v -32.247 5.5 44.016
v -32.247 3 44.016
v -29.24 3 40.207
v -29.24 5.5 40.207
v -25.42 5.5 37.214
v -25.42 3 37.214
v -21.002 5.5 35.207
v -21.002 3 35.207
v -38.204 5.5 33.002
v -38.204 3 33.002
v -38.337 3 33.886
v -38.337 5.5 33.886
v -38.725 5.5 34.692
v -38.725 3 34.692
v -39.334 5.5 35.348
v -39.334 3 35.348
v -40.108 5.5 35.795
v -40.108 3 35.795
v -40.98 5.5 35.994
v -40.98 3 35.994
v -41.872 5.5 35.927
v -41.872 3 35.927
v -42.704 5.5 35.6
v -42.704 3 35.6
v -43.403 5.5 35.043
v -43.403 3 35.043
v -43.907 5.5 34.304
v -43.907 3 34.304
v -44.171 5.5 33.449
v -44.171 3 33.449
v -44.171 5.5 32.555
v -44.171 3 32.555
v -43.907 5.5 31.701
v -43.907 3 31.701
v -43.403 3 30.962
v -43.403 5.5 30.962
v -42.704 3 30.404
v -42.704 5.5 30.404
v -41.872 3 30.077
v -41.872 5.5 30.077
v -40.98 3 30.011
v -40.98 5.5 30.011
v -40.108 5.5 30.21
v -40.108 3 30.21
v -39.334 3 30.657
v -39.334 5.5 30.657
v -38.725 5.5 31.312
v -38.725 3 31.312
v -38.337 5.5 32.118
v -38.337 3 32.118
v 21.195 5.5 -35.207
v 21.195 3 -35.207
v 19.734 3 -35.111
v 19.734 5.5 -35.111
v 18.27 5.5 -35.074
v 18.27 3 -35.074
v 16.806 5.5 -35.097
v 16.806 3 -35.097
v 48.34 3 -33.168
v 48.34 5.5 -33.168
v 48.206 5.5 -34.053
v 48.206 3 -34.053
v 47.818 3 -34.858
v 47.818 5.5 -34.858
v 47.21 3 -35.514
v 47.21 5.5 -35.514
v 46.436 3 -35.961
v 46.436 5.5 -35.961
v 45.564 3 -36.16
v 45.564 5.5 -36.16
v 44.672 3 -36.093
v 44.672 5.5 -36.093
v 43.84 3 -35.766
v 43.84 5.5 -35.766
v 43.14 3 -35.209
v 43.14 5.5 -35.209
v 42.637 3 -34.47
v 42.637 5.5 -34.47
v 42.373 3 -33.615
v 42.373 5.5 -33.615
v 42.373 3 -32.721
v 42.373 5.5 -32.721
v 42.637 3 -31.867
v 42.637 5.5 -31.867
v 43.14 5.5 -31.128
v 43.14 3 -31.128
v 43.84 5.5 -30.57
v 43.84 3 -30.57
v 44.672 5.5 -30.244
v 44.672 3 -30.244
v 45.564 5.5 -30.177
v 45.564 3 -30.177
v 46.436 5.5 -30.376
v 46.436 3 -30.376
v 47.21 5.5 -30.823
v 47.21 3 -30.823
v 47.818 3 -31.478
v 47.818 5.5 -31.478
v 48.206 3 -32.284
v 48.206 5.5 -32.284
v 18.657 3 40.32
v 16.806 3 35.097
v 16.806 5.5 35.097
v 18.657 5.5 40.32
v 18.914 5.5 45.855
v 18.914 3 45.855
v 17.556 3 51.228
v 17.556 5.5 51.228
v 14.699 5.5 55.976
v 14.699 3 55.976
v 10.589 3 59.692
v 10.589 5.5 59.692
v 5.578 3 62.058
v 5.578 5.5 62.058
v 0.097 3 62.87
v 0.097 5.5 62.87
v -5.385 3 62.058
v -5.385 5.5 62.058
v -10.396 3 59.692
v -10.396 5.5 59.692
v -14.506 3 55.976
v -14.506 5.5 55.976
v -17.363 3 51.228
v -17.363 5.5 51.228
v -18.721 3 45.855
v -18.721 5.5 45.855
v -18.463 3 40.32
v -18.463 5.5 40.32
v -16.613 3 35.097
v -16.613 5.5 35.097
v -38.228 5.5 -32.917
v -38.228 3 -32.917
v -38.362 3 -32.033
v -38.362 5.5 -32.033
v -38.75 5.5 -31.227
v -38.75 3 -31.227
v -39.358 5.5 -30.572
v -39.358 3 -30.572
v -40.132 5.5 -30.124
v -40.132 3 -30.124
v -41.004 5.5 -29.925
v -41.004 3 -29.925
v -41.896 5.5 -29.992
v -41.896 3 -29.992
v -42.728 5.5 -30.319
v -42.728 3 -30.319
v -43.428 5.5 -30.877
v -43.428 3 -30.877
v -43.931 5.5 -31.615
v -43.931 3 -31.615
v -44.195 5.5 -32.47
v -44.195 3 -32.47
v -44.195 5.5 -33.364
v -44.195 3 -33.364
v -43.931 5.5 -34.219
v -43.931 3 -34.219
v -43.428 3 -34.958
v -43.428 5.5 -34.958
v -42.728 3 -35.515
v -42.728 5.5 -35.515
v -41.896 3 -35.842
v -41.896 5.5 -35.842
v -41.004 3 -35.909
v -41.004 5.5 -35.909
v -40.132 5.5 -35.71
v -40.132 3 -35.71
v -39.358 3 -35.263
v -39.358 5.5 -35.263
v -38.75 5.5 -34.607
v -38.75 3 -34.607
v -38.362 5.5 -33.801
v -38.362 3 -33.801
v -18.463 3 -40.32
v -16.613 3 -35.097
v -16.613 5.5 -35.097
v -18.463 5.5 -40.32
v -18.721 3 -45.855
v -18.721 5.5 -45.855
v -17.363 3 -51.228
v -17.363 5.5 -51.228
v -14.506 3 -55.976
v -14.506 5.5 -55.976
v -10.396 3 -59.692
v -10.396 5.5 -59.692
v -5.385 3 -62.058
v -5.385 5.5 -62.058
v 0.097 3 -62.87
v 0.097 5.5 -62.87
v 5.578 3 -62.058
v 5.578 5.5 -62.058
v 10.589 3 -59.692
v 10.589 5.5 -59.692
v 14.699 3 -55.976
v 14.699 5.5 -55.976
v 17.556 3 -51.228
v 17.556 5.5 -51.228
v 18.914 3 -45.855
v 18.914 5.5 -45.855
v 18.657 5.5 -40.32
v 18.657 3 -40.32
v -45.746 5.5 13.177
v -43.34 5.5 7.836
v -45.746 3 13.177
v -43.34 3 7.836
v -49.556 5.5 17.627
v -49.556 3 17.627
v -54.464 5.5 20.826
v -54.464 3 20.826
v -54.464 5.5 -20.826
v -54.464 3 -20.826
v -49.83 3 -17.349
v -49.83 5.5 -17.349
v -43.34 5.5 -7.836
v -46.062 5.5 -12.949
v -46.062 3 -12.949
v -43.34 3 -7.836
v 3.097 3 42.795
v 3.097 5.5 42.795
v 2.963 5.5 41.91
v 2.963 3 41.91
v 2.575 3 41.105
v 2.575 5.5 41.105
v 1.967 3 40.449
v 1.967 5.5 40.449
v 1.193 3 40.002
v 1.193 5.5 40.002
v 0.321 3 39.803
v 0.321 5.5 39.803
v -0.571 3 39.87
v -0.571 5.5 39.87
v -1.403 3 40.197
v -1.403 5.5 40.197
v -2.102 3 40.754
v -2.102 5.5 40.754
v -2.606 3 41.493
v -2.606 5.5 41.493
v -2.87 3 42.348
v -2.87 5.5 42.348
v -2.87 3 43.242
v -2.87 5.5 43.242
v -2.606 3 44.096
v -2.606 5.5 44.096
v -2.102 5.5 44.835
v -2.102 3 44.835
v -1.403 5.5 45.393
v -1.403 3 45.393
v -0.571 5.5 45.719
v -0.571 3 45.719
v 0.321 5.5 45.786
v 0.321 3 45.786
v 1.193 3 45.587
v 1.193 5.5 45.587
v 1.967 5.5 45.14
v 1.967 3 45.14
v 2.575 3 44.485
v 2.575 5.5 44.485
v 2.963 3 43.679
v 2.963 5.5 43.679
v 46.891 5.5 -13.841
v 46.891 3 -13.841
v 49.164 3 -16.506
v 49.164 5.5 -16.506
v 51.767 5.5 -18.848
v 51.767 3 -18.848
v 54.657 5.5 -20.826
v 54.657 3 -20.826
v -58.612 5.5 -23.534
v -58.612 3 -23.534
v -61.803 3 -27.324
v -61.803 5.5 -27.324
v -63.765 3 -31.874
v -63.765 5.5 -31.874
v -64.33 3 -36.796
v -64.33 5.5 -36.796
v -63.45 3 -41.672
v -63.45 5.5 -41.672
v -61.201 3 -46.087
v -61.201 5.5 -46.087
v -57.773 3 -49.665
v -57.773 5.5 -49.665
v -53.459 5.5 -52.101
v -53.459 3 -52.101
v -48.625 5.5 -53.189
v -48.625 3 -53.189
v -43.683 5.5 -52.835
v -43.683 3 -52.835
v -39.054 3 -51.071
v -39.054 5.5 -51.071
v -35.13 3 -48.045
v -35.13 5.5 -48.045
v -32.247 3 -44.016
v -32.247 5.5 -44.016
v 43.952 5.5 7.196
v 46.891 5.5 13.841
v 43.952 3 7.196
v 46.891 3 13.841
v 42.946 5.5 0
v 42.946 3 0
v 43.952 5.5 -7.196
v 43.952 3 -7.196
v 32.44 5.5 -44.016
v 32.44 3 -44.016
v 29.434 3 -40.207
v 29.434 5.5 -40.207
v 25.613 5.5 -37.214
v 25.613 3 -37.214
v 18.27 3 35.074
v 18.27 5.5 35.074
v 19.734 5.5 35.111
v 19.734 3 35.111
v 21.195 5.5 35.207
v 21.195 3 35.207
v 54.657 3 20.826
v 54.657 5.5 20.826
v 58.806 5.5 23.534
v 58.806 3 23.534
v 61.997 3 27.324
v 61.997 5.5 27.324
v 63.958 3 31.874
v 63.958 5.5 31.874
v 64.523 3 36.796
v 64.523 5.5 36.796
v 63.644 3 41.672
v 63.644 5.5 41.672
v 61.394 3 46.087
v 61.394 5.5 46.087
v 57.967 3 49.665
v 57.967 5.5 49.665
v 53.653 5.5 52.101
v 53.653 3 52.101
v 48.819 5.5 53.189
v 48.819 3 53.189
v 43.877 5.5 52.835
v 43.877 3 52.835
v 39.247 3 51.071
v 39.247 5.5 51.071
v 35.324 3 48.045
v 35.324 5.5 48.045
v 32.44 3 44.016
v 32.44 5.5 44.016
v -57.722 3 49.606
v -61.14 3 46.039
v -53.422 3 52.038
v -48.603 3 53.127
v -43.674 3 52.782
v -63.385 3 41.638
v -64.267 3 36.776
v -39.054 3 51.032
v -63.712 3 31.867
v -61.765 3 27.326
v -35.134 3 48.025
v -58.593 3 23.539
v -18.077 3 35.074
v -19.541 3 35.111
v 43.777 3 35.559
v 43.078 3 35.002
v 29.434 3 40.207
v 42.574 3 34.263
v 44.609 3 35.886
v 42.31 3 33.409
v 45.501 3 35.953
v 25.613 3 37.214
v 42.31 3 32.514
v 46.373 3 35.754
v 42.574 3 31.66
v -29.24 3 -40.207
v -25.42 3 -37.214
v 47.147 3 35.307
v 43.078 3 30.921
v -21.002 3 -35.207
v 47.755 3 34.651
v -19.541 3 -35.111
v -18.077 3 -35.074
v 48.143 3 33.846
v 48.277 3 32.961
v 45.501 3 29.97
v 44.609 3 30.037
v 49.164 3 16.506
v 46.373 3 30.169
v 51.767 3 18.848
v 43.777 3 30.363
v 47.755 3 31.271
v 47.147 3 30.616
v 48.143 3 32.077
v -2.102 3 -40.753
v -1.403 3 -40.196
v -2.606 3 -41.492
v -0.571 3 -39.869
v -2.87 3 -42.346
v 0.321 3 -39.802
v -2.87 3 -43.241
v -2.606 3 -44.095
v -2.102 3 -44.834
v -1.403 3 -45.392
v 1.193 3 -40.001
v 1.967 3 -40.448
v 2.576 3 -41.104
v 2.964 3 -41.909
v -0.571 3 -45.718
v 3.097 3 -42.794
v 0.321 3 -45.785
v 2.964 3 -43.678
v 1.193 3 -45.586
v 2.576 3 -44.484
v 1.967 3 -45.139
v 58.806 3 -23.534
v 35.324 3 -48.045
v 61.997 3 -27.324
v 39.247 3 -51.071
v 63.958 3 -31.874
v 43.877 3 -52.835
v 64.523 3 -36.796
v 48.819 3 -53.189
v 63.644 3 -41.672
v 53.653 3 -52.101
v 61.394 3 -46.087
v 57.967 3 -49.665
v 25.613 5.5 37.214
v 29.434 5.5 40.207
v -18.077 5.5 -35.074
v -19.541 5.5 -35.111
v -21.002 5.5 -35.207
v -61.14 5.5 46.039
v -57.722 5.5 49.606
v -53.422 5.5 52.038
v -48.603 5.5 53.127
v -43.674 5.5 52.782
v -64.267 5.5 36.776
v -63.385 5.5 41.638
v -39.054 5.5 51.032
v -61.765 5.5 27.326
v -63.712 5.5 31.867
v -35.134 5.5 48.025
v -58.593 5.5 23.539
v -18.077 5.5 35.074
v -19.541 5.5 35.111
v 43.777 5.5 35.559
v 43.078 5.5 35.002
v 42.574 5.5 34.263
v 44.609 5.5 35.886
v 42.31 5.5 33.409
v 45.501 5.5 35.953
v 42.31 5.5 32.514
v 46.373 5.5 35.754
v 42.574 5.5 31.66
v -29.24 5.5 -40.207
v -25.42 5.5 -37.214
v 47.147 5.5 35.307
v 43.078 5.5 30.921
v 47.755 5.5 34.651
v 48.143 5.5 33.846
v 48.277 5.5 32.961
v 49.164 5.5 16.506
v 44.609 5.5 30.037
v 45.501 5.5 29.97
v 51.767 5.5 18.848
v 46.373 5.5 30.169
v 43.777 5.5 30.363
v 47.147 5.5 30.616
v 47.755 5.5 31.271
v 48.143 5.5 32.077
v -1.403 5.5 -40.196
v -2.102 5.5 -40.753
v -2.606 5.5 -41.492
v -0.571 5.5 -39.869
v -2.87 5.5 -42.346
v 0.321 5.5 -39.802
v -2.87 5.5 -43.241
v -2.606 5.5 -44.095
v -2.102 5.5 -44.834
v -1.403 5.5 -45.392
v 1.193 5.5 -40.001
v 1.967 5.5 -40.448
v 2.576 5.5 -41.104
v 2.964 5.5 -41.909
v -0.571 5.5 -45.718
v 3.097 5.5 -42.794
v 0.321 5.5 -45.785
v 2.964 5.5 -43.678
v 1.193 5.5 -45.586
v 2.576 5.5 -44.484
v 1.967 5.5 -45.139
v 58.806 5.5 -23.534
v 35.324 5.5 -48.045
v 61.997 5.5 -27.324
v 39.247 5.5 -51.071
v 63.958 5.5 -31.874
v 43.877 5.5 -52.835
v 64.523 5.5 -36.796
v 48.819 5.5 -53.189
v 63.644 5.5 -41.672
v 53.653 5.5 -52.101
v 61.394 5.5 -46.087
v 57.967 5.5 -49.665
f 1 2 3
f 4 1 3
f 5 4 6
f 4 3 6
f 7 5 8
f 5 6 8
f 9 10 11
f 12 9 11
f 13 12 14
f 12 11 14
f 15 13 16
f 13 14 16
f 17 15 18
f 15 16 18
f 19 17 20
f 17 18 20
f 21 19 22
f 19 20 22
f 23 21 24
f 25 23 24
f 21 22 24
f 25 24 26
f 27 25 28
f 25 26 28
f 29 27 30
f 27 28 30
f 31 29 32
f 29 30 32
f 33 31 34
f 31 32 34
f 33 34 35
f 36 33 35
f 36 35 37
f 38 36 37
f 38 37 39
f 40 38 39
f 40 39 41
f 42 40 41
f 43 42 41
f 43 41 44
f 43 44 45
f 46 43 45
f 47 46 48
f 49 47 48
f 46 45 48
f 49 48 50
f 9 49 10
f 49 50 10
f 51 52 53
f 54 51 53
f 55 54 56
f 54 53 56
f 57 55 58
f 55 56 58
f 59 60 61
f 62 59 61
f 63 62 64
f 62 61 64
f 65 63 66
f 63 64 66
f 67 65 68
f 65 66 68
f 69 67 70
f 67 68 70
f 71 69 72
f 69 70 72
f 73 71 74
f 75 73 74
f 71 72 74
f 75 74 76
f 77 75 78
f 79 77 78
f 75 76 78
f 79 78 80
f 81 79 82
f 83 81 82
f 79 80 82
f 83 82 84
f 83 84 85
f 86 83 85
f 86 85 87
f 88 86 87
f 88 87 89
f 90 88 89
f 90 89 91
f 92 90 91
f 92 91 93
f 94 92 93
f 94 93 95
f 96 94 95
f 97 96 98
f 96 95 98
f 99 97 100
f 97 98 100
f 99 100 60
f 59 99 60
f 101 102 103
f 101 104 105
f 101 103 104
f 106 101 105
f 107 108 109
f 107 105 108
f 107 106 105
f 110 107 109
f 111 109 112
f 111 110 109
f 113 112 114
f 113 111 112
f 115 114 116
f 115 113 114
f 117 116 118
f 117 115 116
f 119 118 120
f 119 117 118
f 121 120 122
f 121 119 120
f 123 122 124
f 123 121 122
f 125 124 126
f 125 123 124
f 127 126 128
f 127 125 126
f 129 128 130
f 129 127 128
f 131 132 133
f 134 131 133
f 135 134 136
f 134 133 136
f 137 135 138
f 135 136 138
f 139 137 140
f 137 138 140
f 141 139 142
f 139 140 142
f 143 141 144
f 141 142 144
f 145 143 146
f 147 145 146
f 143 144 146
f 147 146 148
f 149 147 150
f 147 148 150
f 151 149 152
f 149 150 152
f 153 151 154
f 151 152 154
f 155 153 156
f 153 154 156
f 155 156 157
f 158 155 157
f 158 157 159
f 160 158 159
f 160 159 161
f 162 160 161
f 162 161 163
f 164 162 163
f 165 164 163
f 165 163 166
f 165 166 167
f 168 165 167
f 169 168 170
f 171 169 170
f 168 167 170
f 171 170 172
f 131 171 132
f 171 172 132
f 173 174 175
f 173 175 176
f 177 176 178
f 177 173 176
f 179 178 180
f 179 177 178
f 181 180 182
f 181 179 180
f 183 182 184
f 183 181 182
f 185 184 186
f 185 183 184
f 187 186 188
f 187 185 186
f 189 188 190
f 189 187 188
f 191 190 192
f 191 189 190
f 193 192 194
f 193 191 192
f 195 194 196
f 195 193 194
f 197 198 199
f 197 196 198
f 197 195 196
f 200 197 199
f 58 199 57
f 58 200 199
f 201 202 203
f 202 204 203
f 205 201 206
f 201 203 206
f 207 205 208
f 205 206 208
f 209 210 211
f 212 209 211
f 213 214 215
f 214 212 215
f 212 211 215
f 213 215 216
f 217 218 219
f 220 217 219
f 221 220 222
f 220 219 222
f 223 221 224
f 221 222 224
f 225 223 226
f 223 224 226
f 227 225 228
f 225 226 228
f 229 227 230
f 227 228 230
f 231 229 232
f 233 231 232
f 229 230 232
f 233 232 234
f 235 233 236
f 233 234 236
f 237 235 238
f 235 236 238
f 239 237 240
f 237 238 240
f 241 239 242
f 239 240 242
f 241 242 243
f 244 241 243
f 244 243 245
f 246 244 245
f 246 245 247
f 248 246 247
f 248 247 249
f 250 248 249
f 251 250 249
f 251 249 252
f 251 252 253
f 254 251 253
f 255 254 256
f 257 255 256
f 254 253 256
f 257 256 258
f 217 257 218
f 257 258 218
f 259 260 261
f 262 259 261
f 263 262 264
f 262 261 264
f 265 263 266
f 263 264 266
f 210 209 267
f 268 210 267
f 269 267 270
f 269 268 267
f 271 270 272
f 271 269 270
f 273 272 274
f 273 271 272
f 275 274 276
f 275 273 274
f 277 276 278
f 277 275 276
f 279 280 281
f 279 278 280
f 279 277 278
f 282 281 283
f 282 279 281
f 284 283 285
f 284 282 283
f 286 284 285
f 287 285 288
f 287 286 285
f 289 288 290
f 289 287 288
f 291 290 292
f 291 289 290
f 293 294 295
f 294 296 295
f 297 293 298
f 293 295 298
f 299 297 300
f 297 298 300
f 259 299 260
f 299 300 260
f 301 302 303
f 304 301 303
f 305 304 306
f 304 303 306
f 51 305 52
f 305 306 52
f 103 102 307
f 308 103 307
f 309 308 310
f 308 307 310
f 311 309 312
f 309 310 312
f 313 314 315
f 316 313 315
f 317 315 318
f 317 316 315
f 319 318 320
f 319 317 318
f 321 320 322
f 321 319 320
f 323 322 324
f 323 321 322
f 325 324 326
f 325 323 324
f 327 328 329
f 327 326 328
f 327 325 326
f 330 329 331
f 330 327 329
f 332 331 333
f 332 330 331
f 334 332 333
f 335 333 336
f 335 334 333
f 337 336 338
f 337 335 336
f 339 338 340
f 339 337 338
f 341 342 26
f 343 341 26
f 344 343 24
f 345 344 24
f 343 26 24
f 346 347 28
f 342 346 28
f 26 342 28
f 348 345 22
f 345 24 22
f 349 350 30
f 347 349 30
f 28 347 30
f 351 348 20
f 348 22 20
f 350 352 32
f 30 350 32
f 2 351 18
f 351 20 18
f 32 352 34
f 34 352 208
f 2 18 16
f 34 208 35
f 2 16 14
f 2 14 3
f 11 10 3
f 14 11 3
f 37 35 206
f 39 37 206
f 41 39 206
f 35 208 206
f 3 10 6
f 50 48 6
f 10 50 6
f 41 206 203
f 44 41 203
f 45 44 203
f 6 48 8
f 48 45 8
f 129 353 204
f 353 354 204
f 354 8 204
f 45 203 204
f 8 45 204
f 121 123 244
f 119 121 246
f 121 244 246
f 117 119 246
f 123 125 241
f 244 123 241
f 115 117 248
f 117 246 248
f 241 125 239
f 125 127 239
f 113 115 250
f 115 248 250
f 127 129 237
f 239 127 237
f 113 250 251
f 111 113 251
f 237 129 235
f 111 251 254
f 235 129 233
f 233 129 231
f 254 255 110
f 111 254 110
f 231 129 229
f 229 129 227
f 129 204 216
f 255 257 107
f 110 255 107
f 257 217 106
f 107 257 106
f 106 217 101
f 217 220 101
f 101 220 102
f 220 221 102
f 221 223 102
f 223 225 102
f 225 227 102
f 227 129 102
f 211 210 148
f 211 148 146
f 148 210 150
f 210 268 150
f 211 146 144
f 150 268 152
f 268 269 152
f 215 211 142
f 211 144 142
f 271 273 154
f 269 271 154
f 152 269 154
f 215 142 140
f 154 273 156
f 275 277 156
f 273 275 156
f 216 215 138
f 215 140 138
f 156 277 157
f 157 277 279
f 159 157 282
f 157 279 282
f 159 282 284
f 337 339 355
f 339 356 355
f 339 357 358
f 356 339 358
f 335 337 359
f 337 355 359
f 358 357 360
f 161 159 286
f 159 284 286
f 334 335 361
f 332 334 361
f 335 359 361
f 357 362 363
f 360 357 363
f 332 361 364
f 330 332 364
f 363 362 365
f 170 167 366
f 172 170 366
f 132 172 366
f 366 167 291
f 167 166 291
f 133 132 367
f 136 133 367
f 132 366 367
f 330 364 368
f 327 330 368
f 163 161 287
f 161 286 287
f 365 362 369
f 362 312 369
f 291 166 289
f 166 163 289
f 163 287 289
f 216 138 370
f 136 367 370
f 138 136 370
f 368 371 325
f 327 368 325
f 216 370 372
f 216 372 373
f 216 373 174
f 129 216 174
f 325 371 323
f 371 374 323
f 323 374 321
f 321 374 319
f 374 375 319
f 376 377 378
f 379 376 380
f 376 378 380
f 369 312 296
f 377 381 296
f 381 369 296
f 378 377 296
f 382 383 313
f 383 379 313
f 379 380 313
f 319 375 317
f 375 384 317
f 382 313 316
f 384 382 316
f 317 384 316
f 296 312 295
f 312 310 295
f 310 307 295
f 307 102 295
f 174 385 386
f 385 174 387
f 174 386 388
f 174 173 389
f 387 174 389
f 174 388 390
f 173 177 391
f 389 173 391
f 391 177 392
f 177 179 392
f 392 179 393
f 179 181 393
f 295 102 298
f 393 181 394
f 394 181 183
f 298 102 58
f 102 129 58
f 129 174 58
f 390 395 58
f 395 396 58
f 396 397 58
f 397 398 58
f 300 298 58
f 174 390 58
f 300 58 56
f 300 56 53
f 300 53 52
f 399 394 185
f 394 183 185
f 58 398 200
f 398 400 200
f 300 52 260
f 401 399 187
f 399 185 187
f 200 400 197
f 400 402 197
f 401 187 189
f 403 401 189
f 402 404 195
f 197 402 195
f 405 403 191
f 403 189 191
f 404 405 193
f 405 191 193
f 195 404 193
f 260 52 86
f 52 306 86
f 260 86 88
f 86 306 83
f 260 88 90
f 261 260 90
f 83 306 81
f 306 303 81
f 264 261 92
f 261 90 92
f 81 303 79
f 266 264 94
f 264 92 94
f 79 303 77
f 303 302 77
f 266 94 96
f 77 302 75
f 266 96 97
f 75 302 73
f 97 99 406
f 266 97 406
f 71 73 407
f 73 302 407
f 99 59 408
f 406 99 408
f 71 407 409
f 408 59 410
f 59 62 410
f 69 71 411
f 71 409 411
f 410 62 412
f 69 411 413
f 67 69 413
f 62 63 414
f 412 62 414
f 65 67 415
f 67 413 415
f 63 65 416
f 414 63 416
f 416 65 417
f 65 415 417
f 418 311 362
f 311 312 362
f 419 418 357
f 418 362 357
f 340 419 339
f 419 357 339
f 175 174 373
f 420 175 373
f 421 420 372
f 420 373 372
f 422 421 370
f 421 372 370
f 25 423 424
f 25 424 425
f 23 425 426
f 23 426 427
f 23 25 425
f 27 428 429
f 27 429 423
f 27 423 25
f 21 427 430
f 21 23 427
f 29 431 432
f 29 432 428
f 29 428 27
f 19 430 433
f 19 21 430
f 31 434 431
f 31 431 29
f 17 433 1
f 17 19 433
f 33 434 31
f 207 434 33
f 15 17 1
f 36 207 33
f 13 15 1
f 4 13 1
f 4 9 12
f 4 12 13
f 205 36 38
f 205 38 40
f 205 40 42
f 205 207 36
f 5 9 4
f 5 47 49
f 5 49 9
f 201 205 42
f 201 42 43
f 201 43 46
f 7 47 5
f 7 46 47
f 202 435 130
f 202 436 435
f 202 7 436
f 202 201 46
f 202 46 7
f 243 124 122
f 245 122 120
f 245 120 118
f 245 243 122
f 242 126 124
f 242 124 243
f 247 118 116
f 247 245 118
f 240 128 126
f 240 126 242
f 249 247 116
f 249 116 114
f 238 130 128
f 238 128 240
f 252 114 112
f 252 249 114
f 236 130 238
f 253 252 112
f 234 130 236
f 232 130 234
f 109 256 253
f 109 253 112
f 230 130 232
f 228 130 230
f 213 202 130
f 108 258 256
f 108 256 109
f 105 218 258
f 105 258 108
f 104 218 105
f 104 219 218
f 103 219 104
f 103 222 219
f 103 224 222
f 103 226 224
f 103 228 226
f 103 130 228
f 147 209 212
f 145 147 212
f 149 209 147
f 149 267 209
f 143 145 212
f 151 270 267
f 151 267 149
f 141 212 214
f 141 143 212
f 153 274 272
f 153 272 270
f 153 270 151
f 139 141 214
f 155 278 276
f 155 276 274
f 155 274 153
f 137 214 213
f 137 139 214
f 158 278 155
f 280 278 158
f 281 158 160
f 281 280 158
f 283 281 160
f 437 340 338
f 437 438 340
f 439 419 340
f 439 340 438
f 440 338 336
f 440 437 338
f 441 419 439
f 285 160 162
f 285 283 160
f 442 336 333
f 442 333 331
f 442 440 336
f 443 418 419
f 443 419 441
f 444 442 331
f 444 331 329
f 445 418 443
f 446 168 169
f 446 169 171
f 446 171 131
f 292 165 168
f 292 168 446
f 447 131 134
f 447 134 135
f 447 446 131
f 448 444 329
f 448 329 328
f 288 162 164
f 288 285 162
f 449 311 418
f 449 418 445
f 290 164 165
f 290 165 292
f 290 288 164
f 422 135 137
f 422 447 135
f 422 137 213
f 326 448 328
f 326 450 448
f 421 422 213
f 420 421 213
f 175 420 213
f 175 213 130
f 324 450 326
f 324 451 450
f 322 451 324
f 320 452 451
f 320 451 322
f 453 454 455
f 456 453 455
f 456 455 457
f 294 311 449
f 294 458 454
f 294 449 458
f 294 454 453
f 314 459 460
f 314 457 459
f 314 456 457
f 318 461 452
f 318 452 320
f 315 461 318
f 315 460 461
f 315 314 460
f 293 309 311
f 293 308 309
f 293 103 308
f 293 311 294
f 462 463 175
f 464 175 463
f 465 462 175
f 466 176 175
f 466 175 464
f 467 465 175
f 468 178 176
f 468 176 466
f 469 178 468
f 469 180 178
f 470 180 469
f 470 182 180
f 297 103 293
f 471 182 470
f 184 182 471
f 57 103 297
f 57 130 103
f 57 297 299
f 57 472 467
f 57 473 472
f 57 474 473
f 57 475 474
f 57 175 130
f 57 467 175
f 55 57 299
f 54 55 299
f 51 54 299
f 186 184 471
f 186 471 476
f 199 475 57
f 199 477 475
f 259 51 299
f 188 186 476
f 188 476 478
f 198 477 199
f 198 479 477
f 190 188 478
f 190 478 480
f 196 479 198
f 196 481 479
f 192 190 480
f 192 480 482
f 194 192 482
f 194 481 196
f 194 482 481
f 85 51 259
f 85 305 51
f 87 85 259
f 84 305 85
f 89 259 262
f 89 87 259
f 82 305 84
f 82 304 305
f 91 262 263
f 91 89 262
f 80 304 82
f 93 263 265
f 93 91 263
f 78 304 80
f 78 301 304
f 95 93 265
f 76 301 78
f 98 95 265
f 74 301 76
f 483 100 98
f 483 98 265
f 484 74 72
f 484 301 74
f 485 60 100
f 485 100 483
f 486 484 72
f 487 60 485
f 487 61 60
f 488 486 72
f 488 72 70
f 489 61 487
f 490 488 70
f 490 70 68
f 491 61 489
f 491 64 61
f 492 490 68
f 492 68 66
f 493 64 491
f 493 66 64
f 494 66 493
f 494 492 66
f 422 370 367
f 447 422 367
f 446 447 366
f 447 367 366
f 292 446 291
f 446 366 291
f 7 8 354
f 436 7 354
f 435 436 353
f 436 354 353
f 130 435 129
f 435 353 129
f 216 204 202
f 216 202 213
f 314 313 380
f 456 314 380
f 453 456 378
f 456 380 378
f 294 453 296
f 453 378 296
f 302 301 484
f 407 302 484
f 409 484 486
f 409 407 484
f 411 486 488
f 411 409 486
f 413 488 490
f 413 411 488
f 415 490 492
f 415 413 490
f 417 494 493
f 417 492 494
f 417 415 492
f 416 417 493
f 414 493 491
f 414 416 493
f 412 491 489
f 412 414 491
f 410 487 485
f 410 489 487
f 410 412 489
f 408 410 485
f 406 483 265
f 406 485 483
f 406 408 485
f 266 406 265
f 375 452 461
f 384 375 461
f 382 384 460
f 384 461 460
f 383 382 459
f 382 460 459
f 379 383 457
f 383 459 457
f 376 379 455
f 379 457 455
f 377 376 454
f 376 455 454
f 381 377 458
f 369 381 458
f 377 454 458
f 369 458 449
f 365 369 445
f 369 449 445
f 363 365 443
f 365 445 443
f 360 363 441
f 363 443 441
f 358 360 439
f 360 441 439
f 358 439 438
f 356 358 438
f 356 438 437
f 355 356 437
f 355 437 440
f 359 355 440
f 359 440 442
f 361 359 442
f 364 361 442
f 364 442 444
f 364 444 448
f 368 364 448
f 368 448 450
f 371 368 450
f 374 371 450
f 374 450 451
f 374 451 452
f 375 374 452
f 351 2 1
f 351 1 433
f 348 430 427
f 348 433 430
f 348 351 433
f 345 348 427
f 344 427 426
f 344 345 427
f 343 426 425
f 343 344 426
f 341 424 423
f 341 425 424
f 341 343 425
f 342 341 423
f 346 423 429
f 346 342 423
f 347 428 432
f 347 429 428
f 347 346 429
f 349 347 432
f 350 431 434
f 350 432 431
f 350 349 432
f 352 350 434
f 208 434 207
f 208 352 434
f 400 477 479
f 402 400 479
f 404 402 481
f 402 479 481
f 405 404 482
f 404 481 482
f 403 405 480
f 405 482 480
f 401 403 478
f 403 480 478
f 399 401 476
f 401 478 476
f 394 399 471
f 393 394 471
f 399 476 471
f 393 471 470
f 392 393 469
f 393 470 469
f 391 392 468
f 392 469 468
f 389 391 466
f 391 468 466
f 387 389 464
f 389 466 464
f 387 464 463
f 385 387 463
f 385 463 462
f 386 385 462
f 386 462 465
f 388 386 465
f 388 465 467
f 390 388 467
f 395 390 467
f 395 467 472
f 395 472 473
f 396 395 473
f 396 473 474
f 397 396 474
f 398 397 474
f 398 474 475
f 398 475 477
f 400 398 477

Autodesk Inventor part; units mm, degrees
ref_plane "YZ Plane" through (0, 0, 0) normal (1, 0, 0) x (0, 1, 0)
ref_plane "XZ Plane" through (0, 0, 0) normal (0, 1, 0) x (-1, 0, 0)
ref_plane "XY Plane" through (0, 0, 0) normal (0, 0, 1) x (1, 0, 0)
ref_plane "Work Plane1" through (0.0967, 3, -43.9566) normal (0, 1, 0) x (1, 0, 0)
sketch "Sketch1" plane through (0.0967, 3, -43.9566) normal (0, 1, 0) x (1, 0, 0)
  line L0 (-43.4364, -51.7928) -> (-43.4364, -36.1204)
  line L1 (-43.4364, -36.1204) -> (-43.4364, -51.7928) projected
  arc A0 (-43.4364, -36.1204) -> (-54.5602, -23.1308) centre (-68.0614, -45.9505) ccw
  arc A1 (-32.3435, 0.0592) -> (-54.5602, -23.1308) centre (-47.45, -7.7054) ccw
  arc A2 (-32.3435, 0.0592) -> (-54.5602, -23.1308) centre (-47.45, -7.7054) ccw projected
  arc A3 (-32.3435, 0.0592) -> (-21.0984, -8.7493) centre (-14.9187, 10.7219) ccw
  arc A4 (-21.0984, -8.7493) -> (-16.7095, -8.8597) centre (-18.0001, 27.1171) ccw
  arc A5 (16.7095, -8.8597) -> (-16.7095, -8.8597) centre (0, 0) ccw
  arc A6 (16.7095, -8.8597) -> (21.0984, -8.7493) centre (18.0001, 27.1171) ccw
  arc A7 (21.0984, -8.7493) -> (32.3435, 0.0592) centre (14.9187, 10.7219) ccw
  arc A8 (54.5602, -23.1308) -> (32.3435, 0.0592) centre (47.45, -7.7054) ccw
  arc A9 (54.5602, -23.1308) -> (46.7947, -30.1154) centre (68.0614, -45.9505) ccw
  arc A10 (46.7947, -30.1154) -> (46.7947, -57.7978) centre (69.1023, -43.9566) ccw
  arc A11 (46.7947, -57.7978) -> (54.5602, -64.7824) centre (68.0614, -41.9626) ccw
  arc A12 (32.3435, -87.9724) -> (54.5602, -64.7824) centre (47.45, -80.2078) ccw
  arc A13 (32.3435, -87.9724) -> (21.0984, -79.1639) centre (14.9187, -98.6351) ccw
  arc A14 (21.0984, -79.1639) -> (16.7095, -79.0534) centre (18.0001, -115.0303) ccw
  arc A15 (-16.7095, -79.0534) -> (16.7095, -79.0534) centre (0, -87.9132) ccw
  arc A16 (-16.7095, -79.0534) -> (-21.0984, -79.1639) centre (-18.0001, -115.0303) ccw
  arc A17 (-21.0984, -79.1639) -> (-32.3435, -87.9724) centre (-14.9187, -98.6351) ccw
  arc A18 (-54.5602, -64.7824) -> (-32.3435, -87.9724) centre (-47.4075, -80.167) ccw
  arc A19 (-54.5602, -64.7824) -> (-43.4364, -51.7928) centre (-63.2568, -46.0771) ccw
  point P0 (-0.0967, -43.9566)
extrude "Extrusion1" add sketch "Sketch1" along normal blind 2.5
sketch "Sketch2" plane through (0.0967, 5.5, -43.9566) normal (0, 1, 0) x (1, 0, 0)
  point P0 (-0.0967, -43.9566)
sketch "Sketch4" plane through (0.0967, 5.5, -43.9566) normal (0, 1, 0) x (1, 0, 0)
  point P0 (-0.0967, -43.9566)
sketch "Sketch7" plane through (0.0967, 5.5, -43.9566) normal (0, 1, 0) x (1, 0, 0)
  circle A0 centre (0.0002, -1.163) radius 3
  point P0 (-0.0967, -43.9566)
  dimension "d12" = 6
extrude "Extrusion5" cut sketch "Sketch7" against normal blind 3.65
sketch "Sketch8" plane through (0.0967, 5.5, -43.9566) normal (0, 1, 0) x (1, 0, 0)
  arc A0 (-16.7095, -79.0534) -> (16.7095, -79.0534) centre (0, -87.9132) ccw projected
  arc A1 (16.7095, -8.8597) -> (-16.7095, -8.8597) centre (0, 0) ccw projected
  circle A2 centre (0, -86.7513) radius 3
  point P0 (-0.0967, -43.9566)
  dimension "d15" = 87.9132
  dimension "d16" = 6
extrude "Extrusion6" cut sketch "Sketch8" against normal blind 3.65
sketch "Sketch9" plane through (0.0967, 5.5, -43.9566) normal (0, 1, 0) x (1, 0, 0)
  point P0 (-0.0967, -43.9566)
sketch "Sketch21" plane through (0.0967, 5.5, -43.9566) normal (0, 1, 0) x (1, 0, 0)
  circle A0 centre (45.2429, -10.7883) radius 3
  point P0 (-0.0967, -43.9566)
  dimension "d34" = 6
extrude "Extrusion7" cut sketch "Sketch21" against normal blind 4.2875
sketch "Sketch22" plane through (0.0967, 5.5, -43.9566) normal (0, 1, 0) x (1, 0, 0)
  point P0 (-0.0967, -43.9566)
  point P1 (-0.0967, -43.9566)
sketch "Sketch24" plane through (0.0967, 5.5, -43.9566) normal (0, 1, 0) x (1, 0, 0)
  point P0 (-0.0967, -43.9566)
pattern_circular "Circular Pattern1" count 6 over 360 about axis through (45.3396, 5.5, -33.1683) along (0, -1, 0) of "Extrusion7"
sketch "Sketch25" plane through (0.0967, 5.5, -43.9566) normal (0, 1, 0) x (1, 0, 0)
  point P0 (-0.0967, -43.9566)
sketch "Sketch26" plane through (0.0967, 5.5, -43.9566) normal (0, 1, 0) x (1, 0, 0)
  circle A0 centre (45.18, -76.918) radius 3
  point P0 (-0.0967, -43.9566)
  dimension "d41" = 6
extrude "Extrusion8" cut sketch "Sketch26" against normal blind 10
sketch "Sketch27" plane through (0.0967, 3, -43.9566) normal (0, -1, 0) x (1, 0, 0)
  circle A0 centre (-41.3251, 11.0395) radius 3
  point P0 (-0.0967, 43.9566)
  dimension "d44" = 6
extrude "Extrusion9" cut sketch "Sketch27" against normal blind 10
sketch "Sketch28" plane through (0.0967, 3, -43.9566) normal (0, -1, 0) x (1, 0, 0)
  circle A0 centre (-41.3009, 76.9588) radius 3
  point P0 (-0.0967, 43.9566)
  dimension "d47" = 6
extrude "Extrusion10" cut sketch "Sketch28" against normal blind 10
